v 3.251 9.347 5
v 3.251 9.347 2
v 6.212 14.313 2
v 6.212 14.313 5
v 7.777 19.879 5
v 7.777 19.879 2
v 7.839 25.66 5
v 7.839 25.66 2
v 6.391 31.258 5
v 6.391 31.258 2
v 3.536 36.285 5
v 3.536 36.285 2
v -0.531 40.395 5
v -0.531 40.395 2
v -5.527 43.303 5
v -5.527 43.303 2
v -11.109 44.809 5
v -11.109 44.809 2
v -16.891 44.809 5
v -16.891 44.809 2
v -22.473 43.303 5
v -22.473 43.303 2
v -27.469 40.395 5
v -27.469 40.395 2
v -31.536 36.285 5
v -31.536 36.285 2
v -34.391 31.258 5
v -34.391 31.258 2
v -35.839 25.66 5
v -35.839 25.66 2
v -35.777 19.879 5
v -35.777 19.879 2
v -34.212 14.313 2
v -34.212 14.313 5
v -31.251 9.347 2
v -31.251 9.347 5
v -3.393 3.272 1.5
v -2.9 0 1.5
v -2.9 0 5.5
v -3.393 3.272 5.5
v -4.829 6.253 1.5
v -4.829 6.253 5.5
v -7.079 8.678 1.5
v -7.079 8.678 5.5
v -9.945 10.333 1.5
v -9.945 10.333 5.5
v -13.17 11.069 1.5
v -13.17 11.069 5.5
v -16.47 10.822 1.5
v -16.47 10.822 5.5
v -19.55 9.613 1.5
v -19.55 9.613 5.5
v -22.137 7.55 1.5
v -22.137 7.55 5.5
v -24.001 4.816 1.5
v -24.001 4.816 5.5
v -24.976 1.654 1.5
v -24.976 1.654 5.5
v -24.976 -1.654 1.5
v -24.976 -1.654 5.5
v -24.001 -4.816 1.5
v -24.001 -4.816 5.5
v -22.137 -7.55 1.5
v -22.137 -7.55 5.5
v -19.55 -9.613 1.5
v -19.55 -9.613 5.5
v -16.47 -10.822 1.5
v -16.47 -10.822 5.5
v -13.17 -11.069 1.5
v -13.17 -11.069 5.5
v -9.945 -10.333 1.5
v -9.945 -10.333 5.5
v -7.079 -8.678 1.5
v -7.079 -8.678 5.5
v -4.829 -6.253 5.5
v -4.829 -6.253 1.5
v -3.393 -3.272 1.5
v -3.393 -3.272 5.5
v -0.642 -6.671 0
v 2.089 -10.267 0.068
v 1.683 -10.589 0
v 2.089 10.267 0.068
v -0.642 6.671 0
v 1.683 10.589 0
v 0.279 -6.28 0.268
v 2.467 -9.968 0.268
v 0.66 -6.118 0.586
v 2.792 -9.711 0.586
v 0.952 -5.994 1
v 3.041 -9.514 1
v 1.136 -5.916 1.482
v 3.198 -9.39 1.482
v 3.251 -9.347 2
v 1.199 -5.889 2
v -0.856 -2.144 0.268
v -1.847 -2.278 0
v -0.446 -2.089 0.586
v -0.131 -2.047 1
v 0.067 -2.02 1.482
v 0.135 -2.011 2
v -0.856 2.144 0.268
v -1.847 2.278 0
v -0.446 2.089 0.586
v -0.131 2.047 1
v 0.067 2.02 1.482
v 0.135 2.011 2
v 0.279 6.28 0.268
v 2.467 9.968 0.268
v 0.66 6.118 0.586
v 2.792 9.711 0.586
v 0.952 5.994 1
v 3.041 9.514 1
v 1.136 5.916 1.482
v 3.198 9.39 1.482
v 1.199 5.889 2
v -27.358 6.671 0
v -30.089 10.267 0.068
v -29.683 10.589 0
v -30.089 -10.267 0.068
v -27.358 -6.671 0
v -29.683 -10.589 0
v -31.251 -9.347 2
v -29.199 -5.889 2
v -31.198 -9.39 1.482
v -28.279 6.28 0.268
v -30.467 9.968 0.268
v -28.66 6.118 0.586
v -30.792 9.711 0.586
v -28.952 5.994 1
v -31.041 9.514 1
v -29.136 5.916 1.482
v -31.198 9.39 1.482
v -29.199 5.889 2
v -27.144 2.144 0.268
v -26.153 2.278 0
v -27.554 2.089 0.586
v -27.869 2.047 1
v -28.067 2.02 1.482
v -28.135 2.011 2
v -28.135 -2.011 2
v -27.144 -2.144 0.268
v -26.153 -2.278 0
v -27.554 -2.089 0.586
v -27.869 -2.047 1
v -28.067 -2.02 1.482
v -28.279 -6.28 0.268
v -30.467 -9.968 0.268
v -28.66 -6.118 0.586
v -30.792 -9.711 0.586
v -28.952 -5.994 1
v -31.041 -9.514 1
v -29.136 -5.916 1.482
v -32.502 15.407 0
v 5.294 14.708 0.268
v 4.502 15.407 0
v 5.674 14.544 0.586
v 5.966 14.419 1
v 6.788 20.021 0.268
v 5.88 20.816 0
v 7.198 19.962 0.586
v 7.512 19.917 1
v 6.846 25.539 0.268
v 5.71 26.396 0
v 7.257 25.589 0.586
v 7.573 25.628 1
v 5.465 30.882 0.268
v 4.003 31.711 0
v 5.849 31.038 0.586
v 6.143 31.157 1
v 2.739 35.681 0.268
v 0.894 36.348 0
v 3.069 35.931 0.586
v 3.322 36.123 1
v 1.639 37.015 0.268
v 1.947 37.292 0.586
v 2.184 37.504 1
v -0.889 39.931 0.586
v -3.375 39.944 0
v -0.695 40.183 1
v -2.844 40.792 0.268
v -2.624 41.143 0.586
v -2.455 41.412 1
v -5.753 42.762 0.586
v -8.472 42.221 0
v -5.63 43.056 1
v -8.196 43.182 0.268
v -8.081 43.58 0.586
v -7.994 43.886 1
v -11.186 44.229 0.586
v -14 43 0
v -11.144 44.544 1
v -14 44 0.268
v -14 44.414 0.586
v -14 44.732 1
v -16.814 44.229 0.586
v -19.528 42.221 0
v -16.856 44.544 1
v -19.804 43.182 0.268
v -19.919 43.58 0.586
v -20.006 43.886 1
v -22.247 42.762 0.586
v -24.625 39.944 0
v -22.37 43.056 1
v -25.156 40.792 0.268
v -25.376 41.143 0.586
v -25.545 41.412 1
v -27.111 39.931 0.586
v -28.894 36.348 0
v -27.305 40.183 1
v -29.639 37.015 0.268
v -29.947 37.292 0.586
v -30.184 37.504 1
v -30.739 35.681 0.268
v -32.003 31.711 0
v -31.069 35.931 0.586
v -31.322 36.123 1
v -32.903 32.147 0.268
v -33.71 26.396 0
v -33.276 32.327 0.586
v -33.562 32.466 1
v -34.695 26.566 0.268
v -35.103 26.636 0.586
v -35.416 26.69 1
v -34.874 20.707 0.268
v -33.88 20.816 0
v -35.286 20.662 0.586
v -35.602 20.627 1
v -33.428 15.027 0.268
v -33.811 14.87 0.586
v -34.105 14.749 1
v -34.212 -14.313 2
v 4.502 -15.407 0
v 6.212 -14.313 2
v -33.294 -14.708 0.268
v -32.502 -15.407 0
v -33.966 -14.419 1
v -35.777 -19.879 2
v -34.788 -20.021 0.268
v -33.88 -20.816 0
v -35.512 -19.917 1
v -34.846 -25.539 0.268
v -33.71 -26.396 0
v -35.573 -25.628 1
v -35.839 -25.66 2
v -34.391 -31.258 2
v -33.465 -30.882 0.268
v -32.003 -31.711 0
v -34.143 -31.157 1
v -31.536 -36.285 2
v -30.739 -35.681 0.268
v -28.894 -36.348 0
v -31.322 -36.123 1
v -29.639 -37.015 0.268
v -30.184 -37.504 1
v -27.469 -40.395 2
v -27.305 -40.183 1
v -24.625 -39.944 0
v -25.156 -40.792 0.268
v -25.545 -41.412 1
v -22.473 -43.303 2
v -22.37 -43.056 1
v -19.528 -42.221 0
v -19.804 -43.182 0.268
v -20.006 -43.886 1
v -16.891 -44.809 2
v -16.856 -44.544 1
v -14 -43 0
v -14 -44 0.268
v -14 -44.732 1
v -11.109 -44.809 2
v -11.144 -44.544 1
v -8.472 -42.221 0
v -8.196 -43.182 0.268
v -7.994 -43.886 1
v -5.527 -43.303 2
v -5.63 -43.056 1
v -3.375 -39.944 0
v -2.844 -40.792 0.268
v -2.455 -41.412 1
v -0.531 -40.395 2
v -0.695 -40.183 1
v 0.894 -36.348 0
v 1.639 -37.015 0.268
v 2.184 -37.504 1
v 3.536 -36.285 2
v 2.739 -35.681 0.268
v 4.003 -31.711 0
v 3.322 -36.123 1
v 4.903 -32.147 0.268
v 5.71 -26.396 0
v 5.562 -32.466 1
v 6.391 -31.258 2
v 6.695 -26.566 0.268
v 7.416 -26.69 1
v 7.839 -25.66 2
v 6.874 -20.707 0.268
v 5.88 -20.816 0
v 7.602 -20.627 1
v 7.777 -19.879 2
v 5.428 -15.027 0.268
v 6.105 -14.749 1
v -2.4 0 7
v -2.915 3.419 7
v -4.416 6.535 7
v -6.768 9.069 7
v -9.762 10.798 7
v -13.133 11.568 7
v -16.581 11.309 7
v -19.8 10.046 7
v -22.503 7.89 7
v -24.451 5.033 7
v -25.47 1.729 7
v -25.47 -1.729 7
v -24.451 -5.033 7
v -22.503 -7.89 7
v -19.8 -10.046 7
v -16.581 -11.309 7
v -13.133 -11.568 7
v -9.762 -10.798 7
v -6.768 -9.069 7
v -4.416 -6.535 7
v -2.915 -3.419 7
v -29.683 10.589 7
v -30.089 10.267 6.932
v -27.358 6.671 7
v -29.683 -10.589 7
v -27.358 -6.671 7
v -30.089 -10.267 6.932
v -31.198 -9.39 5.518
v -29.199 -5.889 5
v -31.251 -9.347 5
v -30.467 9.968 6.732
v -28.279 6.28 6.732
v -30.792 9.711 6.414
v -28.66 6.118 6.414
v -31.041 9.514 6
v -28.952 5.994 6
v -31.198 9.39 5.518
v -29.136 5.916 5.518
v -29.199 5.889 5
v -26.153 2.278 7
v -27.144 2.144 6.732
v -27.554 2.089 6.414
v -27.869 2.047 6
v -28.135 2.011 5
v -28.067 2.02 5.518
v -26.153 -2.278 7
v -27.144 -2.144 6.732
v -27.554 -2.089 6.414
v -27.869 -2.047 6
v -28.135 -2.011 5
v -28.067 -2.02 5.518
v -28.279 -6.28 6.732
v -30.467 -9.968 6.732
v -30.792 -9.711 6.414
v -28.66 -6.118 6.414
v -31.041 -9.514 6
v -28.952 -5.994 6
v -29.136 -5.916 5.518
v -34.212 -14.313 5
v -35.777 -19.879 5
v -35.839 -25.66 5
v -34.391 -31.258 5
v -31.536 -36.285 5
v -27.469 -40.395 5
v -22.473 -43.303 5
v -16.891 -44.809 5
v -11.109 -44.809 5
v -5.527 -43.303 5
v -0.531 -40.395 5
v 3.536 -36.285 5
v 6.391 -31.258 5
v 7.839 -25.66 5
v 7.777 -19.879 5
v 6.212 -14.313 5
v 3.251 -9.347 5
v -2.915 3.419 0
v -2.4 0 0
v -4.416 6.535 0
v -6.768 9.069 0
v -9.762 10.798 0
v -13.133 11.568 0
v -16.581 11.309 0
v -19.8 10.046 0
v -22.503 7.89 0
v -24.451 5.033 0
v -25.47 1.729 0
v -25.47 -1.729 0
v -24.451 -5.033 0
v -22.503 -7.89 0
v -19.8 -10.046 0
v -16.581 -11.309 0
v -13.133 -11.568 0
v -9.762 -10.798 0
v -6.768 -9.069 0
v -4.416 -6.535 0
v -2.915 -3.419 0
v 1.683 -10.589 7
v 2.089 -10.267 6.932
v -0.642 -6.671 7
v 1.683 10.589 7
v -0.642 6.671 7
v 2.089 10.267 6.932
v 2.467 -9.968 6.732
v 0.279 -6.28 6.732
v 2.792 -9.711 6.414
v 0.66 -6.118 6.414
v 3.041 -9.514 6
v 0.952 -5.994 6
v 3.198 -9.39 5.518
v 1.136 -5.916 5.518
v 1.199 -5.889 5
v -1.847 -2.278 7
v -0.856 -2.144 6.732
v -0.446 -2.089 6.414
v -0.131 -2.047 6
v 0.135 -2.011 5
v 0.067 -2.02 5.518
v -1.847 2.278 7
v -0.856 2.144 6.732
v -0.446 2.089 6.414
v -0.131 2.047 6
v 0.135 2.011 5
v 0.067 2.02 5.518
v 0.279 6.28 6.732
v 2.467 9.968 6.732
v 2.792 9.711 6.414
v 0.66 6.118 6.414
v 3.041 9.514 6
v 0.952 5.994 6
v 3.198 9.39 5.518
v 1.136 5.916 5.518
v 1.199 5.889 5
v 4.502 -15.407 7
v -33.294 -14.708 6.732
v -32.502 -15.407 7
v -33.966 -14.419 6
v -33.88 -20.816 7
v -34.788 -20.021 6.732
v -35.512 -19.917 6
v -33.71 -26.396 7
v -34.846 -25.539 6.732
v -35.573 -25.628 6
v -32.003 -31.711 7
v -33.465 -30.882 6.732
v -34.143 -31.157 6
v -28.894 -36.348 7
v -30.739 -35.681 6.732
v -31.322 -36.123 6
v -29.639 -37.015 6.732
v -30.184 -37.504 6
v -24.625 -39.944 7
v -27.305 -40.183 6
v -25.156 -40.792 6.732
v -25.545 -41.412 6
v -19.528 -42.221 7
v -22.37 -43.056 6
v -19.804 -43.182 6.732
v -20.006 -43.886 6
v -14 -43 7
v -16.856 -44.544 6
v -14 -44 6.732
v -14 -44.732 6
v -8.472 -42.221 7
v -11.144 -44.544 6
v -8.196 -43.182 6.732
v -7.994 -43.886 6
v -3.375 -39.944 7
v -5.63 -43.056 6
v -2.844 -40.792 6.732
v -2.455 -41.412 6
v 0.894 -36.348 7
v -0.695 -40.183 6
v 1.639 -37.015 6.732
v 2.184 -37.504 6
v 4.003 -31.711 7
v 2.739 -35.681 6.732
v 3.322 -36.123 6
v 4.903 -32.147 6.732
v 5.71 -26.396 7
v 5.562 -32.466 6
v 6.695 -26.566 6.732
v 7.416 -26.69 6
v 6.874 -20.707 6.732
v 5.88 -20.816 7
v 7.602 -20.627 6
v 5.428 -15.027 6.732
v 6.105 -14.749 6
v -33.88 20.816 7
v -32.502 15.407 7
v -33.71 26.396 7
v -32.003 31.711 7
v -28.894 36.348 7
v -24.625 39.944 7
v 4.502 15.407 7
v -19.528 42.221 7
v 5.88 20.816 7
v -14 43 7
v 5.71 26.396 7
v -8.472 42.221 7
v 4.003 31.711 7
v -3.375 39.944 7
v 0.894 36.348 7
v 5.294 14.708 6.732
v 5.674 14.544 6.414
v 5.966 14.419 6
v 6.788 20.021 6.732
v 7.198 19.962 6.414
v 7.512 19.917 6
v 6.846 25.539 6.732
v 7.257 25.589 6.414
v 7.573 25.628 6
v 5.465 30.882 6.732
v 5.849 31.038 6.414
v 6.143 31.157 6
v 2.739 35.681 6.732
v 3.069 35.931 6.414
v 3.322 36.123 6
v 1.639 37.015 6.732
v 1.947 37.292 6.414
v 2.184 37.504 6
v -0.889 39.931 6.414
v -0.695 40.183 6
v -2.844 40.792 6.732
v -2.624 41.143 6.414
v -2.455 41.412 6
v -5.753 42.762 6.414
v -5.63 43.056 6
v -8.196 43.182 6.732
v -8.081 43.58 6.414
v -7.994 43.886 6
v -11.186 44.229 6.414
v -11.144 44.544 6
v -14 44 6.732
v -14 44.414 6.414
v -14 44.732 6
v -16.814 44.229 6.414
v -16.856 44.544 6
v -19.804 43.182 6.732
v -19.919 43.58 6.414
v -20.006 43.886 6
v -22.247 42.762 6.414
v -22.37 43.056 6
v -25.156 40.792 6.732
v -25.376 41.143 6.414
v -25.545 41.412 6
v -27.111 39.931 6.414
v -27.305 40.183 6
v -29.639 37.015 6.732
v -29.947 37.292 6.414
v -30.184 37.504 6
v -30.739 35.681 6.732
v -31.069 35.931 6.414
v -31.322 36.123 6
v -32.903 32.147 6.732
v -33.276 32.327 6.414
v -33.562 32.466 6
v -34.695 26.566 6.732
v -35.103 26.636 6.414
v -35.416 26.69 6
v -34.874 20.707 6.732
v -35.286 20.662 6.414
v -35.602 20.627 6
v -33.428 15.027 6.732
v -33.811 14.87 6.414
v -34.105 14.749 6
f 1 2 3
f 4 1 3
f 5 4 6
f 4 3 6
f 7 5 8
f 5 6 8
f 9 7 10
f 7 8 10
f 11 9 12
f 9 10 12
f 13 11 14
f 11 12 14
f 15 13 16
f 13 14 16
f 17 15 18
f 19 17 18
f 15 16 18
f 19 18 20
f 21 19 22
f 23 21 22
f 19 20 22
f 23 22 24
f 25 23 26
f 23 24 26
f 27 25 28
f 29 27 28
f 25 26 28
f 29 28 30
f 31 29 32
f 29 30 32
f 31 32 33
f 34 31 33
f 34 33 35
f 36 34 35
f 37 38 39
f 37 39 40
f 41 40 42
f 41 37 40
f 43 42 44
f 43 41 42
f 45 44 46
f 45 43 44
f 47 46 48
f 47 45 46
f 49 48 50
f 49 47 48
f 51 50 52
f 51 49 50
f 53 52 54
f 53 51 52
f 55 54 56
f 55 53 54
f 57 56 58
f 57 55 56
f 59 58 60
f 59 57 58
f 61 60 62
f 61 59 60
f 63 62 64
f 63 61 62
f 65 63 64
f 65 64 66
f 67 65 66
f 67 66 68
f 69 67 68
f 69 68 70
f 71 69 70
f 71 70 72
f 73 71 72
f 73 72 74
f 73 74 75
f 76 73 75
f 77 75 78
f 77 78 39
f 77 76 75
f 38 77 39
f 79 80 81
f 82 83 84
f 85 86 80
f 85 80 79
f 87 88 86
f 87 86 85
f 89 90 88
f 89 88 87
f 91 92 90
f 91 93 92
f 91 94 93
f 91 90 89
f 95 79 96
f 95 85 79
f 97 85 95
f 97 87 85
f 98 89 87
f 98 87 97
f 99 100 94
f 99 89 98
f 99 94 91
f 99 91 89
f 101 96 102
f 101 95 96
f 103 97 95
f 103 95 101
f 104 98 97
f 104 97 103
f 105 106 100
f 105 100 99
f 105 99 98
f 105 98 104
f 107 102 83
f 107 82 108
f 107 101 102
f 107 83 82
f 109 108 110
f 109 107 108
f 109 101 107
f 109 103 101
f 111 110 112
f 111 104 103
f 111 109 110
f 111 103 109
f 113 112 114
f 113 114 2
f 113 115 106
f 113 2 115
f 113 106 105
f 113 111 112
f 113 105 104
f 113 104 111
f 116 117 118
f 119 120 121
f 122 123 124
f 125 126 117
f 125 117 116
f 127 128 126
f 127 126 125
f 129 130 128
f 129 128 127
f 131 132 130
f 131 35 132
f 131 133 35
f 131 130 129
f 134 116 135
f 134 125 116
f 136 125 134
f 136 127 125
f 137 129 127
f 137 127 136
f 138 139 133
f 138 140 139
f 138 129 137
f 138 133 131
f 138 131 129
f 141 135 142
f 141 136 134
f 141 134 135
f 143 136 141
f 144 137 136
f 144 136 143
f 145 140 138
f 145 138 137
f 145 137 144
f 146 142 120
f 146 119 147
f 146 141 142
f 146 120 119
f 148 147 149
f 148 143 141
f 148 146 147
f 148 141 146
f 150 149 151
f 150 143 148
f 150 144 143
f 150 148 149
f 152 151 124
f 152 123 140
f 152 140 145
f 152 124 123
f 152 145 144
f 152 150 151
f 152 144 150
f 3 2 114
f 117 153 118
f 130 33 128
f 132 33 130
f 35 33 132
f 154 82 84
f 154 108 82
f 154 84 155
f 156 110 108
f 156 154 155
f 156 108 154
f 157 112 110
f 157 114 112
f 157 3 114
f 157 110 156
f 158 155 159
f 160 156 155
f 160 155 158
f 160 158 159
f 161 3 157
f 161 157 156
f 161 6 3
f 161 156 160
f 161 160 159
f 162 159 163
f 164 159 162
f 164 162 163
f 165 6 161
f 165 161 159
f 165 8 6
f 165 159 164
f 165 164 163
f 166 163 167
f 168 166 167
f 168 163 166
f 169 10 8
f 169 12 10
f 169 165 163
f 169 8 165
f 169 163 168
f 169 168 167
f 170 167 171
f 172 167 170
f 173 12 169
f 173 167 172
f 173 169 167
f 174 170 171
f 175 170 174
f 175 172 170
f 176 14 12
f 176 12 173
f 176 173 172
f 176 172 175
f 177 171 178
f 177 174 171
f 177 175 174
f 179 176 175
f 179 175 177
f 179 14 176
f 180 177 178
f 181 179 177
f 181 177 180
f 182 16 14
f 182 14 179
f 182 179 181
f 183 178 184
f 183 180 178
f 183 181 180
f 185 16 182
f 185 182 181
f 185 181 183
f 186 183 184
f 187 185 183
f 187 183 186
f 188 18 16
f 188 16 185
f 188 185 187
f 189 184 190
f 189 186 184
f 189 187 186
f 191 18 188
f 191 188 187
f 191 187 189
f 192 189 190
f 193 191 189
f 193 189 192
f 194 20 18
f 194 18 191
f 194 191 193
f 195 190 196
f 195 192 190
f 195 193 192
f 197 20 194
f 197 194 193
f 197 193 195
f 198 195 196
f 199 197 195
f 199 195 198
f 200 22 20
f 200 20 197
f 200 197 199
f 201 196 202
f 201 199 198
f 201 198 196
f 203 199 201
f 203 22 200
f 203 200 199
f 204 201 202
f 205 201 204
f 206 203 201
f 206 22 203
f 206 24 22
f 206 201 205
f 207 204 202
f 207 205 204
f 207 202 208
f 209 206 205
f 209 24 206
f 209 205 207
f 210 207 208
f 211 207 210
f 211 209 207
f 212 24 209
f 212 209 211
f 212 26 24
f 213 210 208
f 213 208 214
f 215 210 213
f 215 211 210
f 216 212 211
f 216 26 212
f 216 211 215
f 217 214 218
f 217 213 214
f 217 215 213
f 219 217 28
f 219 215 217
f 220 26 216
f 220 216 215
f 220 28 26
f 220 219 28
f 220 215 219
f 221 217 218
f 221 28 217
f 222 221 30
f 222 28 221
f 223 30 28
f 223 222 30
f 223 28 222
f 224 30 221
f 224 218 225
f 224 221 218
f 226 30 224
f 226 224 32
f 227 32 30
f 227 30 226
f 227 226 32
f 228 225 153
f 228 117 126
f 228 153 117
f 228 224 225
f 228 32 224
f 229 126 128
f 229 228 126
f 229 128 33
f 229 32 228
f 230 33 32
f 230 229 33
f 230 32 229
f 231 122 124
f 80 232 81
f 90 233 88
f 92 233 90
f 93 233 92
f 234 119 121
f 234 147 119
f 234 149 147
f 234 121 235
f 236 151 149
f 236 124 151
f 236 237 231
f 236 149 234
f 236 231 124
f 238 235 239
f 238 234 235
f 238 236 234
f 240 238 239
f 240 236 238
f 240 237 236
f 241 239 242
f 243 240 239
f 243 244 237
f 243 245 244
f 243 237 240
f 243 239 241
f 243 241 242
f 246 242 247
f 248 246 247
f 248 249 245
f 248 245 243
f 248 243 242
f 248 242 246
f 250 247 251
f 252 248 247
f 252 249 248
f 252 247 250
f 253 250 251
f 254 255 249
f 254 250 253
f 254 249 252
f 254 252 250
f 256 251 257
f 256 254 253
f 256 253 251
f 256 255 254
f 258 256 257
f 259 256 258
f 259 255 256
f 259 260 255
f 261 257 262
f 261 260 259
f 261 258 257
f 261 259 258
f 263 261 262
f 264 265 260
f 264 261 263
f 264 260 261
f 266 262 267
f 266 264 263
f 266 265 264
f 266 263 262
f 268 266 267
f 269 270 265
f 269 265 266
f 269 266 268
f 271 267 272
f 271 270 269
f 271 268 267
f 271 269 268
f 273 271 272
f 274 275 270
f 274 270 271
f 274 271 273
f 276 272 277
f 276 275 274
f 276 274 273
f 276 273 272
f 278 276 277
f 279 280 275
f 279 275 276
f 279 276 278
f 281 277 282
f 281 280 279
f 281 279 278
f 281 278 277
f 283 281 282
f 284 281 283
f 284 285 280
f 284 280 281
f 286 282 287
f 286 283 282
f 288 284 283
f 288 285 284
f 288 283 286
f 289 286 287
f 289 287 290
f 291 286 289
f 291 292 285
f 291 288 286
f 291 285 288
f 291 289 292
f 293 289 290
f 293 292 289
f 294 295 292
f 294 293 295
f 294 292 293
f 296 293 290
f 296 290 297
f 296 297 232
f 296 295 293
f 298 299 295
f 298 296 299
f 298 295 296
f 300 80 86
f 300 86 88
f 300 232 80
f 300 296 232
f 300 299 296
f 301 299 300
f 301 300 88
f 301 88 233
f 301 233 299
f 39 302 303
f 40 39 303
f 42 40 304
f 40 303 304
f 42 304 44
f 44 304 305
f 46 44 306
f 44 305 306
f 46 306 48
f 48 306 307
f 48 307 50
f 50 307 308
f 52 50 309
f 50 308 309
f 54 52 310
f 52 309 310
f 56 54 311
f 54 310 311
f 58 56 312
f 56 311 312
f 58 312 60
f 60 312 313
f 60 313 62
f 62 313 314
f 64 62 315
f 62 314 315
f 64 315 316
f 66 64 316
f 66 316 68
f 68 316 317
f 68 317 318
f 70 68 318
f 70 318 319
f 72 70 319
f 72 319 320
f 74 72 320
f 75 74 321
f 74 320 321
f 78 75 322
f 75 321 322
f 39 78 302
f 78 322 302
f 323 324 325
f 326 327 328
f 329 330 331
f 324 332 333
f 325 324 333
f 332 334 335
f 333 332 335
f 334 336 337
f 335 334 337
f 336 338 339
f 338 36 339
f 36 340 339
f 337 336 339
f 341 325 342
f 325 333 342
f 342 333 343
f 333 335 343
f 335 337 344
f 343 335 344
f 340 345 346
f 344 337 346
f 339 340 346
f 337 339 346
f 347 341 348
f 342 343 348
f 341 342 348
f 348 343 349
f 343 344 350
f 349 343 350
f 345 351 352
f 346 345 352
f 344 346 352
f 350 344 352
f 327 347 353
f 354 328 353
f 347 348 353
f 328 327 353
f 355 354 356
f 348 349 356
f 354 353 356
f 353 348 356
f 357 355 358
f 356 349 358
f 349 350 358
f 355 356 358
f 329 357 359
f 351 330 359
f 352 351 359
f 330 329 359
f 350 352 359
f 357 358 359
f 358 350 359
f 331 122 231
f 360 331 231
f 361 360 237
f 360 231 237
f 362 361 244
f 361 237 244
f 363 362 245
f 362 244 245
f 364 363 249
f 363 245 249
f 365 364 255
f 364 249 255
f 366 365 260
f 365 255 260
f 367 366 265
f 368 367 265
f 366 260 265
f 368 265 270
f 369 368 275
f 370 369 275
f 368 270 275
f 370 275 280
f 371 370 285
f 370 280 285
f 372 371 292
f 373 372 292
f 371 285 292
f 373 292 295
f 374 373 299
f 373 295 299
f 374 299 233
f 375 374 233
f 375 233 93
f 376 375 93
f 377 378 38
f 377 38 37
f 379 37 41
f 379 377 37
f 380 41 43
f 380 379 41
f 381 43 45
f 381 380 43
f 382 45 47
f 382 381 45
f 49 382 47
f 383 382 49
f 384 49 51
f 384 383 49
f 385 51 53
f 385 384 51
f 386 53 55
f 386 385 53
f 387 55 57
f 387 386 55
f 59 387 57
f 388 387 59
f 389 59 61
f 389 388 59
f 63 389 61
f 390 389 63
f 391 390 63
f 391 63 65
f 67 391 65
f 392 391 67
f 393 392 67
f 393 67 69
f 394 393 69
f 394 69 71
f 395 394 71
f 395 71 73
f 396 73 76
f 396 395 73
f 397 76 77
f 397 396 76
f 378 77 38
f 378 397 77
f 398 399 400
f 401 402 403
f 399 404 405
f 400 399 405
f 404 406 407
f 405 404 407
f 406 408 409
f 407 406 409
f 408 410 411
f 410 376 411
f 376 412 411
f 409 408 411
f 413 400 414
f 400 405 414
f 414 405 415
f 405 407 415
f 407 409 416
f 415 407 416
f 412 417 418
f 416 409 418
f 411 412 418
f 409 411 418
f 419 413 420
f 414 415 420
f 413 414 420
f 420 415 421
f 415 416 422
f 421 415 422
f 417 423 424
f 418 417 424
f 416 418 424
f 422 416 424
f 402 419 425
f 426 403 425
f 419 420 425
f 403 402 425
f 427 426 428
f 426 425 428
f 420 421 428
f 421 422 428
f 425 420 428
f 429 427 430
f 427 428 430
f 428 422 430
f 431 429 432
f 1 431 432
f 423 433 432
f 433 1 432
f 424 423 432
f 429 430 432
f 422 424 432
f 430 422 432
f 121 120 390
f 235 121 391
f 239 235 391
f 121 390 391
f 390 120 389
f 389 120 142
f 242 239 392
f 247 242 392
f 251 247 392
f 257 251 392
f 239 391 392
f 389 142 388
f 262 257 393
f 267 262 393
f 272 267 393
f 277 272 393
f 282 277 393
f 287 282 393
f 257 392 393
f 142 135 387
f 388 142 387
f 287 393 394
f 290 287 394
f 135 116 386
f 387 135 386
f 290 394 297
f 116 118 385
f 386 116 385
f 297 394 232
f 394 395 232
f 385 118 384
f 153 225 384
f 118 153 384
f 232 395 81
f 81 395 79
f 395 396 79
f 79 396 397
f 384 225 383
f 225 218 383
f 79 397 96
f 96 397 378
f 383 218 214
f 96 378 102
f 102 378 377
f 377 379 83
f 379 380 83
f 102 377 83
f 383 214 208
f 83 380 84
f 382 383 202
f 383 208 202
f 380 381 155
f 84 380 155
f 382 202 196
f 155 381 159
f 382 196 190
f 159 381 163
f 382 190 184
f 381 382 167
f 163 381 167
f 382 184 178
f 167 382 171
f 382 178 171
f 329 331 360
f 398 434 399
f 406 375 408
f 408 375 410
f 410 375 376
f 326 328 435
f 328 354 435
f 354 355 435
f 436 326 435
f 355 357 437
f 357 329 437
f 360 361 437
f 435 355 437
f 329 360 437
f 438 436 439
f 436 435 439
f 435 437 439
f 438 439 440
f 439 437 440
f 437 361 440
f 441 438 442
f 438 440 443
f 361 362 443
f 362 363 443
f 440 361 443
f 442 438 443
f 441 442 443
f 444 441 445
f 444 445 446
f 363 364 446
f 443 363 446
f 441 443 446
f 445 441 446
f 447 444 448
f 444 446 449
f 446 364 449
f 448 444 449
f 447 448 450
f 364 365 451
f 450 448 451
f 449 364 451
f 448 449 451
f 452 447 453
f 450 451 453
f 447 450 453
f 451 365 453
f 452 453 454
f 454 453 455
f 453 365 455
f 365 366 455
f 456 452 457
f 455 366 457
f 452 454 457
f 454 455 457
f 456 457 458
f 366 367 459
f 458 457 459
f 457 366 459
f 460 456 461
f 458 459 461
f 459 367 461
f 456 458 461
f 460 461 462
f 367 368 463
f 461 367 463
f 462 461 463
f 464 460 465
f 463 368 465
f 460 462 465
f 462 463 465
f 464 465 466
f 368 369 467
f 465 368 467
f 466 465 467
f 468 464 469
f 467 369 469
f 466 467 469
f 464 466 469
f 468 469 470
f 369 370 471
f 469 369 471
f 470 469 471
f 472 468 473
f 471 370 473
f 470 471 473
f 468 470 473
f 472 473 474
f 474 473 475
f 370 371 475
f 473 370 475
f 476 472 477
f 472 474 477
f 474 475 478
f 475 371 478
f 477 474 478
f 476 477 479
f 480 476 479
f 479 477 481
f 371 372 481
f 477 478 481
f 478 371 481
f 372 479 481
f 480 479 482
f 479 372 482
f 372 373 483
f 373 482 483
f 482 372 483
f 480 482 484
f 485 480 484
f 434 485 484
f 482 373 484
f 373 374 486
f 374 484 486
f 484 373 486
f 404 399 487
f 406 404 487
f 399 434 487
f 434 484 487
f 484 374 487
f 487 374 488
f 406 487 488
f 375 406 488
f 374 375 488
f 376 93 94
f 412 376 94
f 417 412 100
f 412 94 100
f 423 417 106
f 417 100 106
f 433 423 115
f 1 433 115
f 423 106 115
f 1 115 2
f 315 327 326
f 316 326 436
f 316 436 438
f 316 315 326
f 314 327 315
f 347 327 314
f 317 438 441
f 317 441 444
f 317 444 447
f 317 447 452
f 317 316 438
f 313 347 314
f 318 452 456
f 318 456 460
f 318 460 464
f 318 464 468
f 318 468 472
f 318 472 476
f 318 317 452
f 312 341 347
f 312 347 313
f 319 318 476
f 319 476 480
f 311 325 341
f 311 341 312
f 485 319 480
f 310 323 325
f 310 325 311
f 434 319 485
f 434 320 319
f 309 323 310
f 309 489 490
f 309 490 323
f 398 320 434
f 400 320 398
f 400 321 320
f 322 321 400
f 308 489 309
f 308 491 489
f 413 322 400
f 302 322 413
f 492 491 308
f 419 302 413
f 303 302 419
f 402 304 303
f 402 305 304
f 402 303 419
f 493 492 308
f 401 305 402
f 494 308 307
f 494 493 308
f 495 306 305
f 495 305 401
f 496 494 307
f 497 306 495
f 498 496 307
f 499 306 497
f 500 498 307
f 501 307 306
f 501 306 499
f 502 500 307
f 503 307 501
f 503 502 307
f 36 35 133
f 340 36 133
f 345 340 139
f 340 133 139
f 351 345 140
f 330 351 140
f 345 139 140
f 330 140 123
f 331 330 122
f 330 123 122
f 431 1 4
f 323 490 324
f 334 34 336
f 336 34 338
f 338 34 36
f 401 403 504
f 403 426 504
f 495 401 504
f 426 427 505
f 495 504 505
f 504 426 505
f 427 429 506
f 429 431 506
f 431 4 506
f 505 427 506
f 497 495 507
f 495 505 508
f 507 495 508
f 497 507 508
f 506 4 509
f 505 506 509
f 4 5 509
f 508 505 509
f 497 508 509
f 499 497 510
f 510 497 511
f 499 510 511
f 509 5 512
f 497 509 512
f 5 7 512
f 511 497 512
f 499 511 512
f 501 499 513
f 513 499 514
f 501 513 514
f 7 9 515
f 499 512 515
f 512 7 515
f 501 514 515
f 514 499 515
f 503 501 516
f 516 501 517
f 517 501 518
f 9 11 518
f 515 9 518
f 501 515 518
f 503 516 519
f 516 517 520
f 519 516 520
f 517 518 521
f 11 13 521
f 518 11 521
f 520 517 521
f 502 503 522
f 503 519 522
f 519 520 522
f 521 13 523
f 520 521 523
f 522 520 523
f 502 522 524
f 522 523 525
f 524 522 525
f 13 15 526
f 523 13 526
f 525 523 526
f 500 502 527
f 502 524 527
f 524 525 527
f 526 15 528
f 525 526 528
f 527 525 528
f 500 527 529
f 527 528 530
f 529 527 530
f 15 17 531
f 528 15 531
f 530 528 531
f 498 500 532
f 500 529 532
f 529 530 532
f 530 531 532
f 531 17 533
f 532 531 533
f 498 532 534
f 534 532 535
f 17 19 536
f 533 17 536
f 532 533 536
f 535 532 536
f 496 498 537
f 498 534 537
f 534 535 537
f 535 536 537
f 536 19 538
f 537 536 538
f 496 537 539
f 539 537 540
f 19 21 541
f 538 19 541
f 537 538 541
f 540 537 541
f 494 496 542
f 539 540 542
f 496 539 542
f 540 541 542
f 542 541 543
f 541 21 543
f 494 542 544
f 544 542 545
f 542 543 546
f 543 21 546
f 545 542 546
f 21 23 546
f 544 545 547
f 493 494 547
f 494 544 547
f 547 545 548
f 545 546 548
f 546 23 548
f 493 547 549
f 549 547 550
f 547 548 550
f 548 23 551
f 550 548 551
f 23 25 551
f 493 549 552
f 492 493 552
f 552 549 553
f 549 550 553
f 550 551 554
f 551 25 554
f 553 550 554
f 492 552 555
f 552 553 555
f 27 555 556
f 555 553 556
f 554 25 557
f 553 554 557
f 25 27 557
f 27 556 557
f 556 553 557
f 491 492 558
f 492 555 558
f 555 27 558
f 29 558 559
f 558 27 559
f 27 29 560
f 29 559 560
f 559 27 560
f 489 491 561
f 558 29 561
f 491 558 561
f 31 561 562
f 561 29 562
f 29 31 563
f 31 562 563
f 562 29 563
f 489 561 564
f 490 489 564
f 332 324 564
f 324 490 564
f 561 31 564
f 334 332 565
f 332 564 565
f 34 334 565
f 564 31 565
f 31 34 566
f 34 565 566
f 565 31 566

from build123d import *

# Parameters (mm, degrees)
F0_R     = 11.1
F1_DEPTH = 7
F2_SIZE2 = 0.5
F2_SIZE  = 1.5
F3_R     = 2


with BuildPart() as f1:
    # F0 (on Top) → F1 (new body)
    with BuildSketch(Plane.XY):
        with BuildLine():
            ThreePointArc((-31.251265, 9.347386), (-28, 0), (-31.251265, -9.347386))
            ThreePointArc((-31.251265, -9.347386), (-14, -45), (3.251265, -9.347386))
            ThreePointArc((3.251265, -9.347386), (0, 0), (3.251265, 9.347386))
            ThreePointArc((3.251265, 9.347386), (-14, 45), (-31.251265, 9.347386))
        make_face()
        with Locations((-14, 0)):
            Circle(F0_R, mode=Mode.SUBTRACT)
    extrude(amount=F1_DEPTH)

    # F2
    f2_edges = [f1.edges().sort_by_distance(p)[0] for p in [
        (-25.1, 0, 7),
        (-25.1, 0, 0),
    ]]
    chamfer(f2_edges, length=F2_SIZE, length2=F2_SIZE2)

    # F3
    f3_edges = [f1.edges().sort_by_distance(p)[0] for p in [
        (-14, -45, 7),
        (-14, -45, 0),
    ]]
    fillet(f3_edges, radius=F3_R)


solid = f1.part
